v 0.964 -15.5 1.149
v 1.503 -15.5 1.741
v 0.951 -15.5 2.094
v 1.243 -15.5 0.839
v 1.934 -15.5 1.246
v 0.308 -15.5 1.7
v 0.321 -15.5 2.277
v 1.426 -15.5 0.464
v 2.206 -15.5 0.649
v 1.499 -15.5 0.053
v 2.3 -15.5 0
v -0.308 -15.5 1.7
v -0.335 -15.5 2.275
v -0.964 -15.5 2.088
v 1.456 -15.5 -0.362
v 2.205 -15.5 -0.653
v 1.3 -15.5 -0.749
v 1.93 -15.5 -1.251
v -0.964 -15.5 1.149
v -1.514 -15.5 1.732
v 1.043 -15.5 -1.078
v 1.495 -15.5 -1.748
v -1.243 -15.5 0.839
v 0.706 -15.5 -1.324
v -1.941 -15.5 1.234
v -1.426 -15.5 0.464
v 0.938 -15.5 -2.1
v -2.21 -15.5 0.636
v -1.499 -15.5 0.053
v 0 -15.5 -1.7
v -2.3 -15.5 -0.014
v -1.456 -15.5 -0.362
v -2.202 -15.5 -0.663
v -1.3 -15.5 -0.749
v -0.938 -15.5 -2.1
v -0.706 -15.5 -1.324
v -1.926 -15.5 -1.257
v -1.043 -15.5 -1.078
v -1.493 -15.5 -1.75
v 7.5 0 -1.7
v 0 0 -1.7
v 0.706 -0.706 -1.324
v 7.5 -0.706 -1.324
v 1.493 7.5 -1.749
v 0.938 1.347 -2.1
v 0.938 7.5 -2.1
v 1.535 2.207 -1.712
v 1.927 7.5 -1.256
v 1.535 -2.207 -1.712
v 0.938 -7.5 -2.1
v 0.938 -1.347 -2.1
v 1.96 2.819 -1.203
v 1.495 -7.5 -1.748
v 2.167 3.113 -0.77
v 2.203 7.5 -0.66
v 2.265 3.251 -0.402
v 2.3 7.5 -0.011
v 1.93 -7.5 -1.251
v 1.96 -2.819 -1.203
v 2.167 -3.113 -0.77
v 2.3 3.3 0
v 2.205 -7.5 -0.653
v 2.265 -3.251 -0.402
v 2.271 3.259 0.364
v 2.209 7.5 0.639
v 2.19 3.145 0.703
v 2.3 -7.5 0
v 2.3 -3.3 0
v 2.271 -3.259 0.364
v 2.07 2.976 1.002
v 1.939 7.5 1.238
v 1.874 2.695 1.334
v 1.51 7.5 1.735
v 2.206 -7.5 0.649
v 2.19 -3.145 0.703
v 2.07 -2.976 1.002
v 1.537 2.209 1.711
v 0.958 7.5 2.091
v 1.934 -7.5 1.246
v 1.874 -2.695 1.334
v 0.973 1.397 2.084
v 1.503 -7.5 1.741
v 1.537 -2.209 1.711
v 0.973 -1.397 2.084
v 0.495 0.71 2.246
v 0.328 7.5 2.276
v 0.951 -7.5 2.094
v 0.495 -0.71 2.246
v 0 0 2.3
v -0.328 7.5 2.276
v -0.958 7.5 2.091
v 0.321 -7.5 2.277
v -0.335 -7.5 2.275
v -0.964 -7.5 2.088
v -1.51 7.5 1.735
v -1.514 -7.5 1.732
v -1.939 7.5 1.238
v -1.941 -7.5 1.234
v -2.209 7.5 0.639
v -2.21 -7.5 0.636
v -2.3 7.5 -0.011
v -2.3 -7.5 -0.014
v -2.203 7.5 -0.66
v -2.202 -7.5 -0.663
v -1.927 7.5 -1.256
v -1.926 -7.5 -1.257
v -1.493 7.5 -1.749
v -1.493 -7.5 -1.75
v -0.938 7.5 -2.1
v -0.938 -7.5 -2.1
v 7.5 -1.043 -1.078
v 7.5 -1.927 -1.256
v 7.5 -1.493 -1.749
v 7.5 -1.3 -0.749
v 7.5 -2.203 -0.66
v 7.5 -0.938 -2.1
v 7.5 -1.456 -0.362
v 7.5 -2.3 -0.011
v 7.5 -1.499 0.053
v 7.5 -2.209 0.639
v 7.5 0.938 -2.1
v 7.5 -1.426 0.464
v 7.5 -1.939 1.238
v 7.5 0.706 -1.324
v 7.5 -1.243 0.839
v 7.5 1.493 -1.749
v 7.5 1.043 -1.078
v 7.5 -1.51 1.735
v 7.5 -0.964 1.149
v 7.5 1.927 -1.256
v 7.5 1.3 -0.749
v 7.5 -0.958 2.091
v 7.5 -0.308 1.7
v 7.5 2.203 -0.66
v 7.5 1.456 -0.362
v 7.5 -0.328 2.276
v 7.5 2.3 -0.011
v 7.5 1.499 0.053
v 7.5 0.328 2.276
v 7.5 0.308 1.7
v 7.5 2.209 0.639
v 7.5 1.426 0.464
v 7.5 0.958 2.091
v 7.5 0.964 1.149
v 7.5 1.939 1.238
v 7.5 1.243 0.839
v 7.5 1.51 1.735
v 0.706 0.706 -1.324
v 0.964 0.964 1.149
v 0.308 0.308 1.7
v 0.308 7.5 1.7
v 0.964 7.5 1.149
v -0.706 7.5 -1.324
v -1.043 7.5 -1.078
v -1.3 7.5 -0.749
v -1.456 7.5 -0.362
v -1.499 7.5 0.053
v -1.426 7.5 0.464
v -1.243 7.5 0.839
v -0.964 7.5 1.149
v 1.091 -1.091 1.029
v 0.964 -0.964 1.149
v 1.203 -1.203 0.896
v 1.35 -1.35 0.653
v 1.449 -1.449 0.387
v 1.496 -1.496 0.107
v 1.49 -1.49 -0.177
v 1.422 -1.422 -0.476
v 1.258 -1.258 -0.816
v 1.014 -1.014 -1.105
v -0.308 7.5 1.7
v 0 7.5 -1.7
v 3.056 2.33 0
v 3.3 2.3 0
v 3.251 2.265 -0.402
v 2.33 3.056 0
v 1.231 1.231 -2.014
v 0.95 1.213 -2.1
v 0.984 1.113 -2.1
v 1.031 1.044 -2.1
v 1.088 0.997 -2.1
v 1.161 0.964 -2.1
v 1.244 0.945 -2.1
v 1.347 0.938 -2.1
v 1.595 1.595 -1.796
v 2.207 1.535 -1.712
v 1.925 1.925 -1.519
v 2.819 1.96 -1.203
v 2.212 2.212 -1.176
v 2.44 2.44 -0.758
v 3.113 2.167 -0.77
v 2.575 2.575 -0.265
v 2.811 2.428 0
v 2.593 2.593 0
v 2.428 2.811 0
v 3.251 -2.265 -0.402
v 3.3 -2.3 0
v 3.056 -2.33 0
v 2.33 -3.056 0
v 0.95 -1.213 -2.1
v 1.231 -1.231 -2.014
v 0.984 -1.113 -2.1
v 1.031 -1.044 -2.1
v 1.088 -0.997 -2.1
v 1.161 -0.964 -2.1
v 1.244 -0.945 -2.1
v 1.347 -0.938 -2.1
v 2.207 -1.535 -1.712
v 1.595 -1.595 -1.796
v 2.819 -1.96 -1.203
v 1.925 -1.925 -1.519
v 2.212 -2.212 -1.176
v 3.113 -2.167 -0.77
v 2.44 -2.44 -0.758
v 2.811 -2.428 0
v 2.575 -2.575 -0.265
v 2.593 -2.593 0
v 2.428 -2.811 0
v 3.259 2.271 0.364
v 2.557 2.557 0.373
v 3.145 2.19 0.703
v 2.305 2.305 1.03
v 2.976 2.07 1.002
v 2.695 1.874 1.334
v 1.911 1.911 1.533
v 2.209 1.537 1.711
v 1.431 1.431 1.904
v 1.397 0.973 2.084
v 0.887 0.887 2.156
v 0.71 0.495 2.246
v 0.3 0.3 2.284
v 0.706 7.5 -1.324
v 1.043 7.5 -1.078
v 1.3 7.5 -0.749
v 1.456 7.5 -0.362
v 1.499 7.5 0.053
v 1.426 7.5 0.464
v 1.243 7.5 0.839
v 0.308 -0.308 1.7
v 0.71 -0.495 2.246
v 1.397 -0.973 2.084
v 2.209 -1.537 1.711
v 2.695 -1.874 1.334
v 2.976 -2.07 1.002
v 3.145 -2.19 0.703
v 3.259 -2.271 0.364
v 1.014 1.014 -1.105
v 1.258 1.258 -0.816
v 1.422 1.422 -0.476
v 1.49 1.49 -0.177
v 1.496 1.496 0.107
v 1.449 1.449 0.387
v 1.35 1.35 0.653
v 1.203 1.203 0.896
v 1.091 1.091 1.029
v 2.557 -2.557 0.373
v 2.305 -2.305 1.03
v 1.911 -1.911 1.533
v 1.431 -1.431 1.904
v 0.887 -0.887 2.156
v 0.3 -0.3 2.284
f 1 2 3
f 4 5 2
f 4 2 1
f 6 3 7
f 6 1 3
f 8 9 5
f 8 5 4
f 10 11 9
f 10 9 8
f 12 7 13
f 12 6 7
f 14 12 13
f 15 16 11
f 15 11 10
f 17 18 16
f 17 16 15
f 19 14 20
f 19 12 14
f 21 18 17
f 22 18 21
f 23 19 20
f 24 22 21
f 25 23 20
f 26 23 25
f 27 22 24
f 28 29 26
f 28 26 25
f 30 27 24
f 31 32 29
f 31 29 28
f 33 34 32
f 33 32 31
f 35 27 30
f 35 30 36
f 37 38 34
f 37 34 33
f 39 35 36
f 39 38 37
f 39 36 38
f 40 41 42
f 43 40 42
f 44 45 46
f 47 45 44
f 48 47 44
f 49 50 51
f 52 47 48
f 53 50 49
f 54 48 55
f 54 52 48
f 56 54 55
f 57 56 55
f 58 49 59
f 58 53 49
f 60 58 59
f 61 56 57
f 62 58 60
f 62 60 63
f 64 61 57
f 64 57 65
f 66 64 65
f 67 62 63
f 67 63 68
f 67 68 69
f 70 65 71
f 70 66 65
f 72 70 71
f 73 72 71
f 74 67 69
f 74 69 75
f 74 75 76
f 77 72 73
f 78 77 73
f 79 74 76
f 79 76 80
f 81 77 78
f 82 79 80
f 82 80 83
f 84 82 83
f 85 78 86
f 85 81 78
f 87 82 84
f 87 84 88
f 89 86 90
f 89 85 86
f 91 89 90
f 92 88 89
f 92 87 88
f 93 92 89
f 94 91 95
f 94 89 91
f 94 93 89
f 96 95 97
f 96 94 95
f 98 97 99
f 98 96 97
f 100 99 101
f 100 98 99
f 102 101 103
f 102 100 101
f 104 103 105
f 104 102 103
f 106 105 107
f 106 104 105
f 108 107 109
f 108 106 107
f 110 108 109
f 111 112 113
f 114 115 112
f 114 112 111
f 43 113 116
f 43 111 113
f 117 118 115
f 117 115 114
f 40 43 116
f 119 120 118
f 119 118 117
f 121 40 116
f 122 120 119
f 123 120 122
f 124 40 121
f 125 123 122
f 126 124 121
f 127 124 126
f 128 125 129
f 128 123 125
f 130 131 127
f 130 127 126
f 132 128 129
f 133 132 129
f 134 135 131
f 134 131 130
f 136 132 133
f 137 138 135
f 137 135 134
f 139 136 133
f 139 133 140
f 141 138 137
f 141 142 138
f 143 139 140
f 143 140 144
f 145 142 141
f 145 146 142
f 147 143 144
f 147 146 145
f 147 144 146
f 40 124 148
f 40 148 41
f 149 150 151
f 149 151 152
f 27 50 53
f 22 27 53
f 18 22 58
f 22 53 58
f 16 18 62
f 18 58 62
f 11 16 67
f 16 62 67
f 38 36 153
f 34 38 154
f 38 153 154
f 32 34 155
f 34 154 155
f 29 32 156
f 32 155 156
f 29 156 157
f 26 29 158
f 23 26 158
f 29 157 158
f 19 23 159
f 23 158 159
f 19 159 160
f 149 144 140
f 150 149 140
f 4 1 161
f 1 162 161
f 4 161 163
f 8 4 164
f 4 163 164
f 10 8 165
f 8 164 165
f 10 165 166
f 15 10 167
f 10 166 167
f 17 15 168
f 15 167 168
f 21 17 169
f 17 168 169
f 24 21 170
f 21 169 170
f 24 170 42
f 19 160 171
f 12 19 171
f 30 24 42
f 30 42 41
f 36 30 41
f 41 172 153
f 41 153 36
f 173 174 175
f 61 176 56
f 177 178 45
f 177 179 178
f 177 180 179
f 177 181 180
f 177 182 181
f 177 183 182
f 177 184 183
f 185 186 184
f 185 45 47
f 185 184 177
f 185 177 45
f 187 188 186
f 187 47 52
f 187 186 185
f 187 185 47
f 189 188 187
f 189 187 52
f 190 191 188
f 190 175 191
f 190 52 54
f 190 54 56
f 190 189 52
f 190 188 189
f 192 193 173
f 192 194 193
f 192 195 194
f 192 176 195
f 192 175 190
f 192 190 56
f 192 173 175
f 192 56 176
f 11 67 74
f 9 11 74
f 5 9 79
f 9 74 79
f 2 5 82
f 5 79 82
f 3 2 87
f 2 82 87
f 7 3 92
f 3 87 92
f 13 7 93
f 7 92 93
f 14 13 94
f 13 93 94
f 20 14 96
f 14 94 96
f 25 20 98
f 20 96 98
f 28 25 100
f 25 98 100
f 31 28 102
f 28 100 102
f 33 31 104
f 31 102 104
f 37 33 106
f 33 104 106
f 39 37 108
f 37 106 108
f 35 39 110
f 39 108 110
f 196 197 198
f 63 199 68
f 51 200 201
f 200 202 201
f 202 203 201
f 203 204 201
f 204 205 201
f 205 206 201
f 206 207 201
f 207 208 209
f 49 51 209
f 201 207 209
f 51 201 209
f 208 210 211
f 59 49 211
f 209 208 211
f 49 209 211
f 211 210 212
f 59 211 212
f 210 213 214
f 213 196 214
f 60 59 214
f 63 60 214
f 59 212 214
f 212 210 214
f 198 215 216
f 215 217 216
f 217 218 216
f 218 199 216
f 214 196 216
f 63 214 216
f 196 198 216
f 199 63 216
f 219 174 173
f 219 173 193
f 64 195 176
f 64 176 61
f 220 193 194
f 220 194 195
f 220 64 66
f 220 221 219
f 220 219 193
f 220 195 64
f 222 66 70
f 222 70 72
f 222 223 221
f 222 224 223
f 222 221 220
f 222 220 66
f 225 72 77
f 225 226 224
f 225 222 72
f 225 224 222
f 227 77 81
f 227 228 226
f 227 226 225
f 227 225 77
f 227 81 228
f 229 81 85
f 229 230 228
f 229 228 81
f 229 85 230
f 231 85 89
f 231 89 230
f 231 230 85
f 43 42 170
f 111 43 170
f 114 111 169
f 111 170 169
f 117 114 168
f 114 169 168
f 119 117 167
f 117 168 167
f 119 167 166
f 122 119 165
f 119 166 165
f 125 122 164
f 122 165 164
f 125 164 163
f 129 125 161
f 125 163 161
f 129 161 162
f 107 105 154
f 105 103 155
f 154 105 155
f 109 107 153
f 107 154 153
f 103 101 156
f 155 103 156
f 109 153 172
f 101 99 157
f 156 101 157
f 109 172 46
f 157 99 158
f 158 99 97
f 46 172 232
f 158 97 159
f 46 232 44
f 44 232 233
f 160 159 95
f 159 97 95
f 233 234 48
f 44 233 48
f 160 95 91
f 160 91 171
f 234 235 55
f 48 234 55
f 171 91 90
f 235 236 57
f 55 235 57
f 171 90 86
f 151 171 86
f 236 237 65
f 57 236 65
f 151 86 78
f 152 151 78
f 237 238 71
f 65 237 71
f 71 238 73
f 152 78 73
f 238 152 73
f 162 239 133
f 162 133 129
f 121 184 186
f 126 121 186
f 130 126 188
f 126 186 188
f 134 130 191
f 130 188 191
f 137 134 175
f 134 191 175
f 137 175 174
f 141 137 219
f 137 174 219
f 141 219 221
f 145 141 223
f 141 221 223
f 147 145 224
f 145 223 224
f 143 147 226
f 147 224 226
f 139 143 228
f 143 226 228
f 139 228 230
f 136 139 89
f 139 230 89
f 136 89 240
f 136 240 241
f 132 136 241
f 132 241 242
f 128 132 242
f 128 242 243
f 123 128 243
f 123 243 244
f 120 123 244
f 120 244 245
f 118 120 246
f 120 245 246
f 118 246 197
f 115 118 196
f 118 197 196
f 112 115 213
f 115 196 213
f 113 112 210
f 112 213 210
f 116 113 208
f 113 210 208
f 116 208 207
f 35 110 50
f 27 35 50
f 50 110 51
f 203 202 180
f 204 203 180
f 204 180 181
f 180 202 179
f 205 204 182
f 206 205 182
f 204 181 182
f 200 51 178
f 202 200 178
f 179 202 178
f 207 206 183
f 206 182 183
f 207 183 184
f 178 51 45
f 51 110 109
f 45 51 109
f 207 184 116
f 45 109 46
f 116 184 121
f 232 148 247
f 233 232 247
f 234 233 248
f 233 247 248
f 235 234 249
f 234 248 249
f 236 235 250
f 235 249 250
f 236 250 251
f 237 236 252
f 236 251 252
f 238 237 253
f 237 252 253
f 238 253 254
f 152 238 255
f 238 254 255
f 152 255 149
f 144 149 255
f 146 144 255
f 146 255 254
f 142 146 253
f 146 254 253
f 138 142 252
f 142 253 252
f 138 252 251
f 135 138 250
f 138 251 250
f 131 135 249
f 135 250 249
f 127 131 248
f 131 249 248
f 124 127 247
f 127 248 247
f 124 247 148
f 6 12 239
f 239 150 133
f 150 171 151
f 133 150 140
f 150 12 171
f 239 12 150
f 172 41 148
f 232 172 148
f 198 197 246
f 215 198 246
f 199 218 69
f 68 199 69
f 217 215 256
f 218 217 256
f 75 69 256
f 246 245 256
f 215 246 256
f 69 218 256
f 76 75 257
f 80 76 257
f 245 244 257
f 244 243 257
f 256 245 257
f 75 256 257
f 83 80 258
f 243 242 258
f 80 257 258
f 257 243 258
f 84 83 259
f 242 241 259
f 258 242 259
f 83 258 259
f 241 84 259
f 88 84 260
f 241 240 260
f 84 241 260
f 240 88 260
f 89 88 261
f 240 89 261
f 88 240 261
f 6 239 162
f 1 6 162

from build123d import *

# Parameters (mm, degrees)
SKETCH_R           = 2.3
PAD_DEPTH          = 7.5
SKETCH001_R        = 2.3
PAD001_DEPTH       = 7.5
POCKET_DEPTH       = 44.4982971986
POLARPATTERN_COUNT = 3
POLARPATTERN_ANGLE = 180
FILLET_R           = 1
SKETCH003_W        = 15
SKETCH003_H        = 15
POCKET001_DEPTH    = 0.2
PAD002_DEPTH       = 8


with BuildPart() as part:
    # Sketch → Pad (new body, symmetric)
    with BuildSketch(Plane.XZ):
        Circle(SKETCH_R)
    extrude(amount=PAD_DEPTH, both=True)

    # Sketch001 → Pad001 (join)
    with BuildSketch(Plane.YZ):
        Circle(SKETCH001_R)
    extrude(amount=PAD001_DEPTH)

    # Sketch002 → Pocket (cut, through all)
    with BuildSketch(Plane.XZ):
        with BuildLine():
            ThreePointArc((-0.9641814145, 1.1490666647), (-1.4918817266, -0.1558490097), (-0.7058823529, -1.3235294118))
            Line((-0.7058823529, -1.3235294118), (0, -1.7))
            Line((0, -1.7), (0.7058823529, -1.3235294118))
            ThreePointArc((0.7058823529, -1.3235294118), (1.4918817266, -0.1558490097), (0.9641814145, 1.1490666647))
            Line((0.3076046329, 1.7), (0.9641814145, 1.1490666647))
            Line((-0.3076046329, 1.7), (0.3076046329, 1.7))
            Line((-0.9641814145, 1.1490666647), (-0.3076046329, 1.7))
        make_face()
    pocket = extrude(amount=-POCKET_DEPTH, mode=Mode.SUBTRACT)

    # PolarPattern: Pocket ×3 about axis
    polarpattern_axis = Axis((0, 0, 0), (0, 0, -1))
    for i in range(1, POLARPATTERN_COUNT):
        add(pocket.rotate(polarpattern_axis, i * POLARPATTERN_ANGLE / (POLARPATTERN_COUNT - 1)), mode=Mode.SUBTRACT)

    # Fillet
    fillet_edges = [part.edges().sort_by_distance(p)[0] for p in [
        (1.485912, -1.485912, 1.755581),
        (1.485912, 1.485912, 1.755581),
    ]]
    fillet(fillet_edges, radius=FILLET_R)

    # Sketch003 → Pocket001 (cut)
    with BuildSketch(Plane(origin=(0, 0, -2.3), x_dir=(-1, 0, 0), z_dir=(0, 0, -1))):
        Rectangle(SKETCH003_W, SKETCH003_H)
    extrude(amount=-POCKET001_DEPTH, mode=Mode.SUBTRACT)

    # Pocket001 Face10 → Pad002 (add)
    with BuildSketch(Plane(origin=(0, -7.5, 0.0372192642), x_dir=(-1, 0, 0), z_dir=(0, -1, 0))):
        with BuildLine():
            ThreePointArc((-2.3, 0.0372192642), (1.2514808729, -1.892494607), (0.938083152, 2.1372192642))
            Line((0.938083152, 2.1372192642), (-0.938083152, 2.1372192642))
            ThreePointArc((-0.938083152, 2.1372192642), (-1.9297138712, 1.2887001371), (-2.3, 0.0372192642))
        make_face()
        with BuildLine():
            ThreePointArc((-0.9641814145, -1.1118474005), (-1.4918817266, 0.1930682739), (-0.7058823529, 1.360748676))
            Line((-0.7058823529, 1.360748676), (0, 1.7372192642))
            Line((0, 1.7372192642), (0.7058823529, 1.360748676))
            ThreePointArc((0.7058823529, 1.360748676), (1.4918817266, 0.1930682739), (0.9641814145, -1.1118474005))
            Line((0.9641814145, -1.1118474005), (0.3076046329, -1.6627807358))
            Line((0.3076046329, -1.6627807358), (-0.3076046329, -1.6627807358))
            Line((-0.3076046329, -1.6627807358), (-0.9641814145, -1.1118474005))
        make_face(mode=Mode.SUBTRACT)
    extrude(amount=PAD002_DEPTH)


solid = part.part
